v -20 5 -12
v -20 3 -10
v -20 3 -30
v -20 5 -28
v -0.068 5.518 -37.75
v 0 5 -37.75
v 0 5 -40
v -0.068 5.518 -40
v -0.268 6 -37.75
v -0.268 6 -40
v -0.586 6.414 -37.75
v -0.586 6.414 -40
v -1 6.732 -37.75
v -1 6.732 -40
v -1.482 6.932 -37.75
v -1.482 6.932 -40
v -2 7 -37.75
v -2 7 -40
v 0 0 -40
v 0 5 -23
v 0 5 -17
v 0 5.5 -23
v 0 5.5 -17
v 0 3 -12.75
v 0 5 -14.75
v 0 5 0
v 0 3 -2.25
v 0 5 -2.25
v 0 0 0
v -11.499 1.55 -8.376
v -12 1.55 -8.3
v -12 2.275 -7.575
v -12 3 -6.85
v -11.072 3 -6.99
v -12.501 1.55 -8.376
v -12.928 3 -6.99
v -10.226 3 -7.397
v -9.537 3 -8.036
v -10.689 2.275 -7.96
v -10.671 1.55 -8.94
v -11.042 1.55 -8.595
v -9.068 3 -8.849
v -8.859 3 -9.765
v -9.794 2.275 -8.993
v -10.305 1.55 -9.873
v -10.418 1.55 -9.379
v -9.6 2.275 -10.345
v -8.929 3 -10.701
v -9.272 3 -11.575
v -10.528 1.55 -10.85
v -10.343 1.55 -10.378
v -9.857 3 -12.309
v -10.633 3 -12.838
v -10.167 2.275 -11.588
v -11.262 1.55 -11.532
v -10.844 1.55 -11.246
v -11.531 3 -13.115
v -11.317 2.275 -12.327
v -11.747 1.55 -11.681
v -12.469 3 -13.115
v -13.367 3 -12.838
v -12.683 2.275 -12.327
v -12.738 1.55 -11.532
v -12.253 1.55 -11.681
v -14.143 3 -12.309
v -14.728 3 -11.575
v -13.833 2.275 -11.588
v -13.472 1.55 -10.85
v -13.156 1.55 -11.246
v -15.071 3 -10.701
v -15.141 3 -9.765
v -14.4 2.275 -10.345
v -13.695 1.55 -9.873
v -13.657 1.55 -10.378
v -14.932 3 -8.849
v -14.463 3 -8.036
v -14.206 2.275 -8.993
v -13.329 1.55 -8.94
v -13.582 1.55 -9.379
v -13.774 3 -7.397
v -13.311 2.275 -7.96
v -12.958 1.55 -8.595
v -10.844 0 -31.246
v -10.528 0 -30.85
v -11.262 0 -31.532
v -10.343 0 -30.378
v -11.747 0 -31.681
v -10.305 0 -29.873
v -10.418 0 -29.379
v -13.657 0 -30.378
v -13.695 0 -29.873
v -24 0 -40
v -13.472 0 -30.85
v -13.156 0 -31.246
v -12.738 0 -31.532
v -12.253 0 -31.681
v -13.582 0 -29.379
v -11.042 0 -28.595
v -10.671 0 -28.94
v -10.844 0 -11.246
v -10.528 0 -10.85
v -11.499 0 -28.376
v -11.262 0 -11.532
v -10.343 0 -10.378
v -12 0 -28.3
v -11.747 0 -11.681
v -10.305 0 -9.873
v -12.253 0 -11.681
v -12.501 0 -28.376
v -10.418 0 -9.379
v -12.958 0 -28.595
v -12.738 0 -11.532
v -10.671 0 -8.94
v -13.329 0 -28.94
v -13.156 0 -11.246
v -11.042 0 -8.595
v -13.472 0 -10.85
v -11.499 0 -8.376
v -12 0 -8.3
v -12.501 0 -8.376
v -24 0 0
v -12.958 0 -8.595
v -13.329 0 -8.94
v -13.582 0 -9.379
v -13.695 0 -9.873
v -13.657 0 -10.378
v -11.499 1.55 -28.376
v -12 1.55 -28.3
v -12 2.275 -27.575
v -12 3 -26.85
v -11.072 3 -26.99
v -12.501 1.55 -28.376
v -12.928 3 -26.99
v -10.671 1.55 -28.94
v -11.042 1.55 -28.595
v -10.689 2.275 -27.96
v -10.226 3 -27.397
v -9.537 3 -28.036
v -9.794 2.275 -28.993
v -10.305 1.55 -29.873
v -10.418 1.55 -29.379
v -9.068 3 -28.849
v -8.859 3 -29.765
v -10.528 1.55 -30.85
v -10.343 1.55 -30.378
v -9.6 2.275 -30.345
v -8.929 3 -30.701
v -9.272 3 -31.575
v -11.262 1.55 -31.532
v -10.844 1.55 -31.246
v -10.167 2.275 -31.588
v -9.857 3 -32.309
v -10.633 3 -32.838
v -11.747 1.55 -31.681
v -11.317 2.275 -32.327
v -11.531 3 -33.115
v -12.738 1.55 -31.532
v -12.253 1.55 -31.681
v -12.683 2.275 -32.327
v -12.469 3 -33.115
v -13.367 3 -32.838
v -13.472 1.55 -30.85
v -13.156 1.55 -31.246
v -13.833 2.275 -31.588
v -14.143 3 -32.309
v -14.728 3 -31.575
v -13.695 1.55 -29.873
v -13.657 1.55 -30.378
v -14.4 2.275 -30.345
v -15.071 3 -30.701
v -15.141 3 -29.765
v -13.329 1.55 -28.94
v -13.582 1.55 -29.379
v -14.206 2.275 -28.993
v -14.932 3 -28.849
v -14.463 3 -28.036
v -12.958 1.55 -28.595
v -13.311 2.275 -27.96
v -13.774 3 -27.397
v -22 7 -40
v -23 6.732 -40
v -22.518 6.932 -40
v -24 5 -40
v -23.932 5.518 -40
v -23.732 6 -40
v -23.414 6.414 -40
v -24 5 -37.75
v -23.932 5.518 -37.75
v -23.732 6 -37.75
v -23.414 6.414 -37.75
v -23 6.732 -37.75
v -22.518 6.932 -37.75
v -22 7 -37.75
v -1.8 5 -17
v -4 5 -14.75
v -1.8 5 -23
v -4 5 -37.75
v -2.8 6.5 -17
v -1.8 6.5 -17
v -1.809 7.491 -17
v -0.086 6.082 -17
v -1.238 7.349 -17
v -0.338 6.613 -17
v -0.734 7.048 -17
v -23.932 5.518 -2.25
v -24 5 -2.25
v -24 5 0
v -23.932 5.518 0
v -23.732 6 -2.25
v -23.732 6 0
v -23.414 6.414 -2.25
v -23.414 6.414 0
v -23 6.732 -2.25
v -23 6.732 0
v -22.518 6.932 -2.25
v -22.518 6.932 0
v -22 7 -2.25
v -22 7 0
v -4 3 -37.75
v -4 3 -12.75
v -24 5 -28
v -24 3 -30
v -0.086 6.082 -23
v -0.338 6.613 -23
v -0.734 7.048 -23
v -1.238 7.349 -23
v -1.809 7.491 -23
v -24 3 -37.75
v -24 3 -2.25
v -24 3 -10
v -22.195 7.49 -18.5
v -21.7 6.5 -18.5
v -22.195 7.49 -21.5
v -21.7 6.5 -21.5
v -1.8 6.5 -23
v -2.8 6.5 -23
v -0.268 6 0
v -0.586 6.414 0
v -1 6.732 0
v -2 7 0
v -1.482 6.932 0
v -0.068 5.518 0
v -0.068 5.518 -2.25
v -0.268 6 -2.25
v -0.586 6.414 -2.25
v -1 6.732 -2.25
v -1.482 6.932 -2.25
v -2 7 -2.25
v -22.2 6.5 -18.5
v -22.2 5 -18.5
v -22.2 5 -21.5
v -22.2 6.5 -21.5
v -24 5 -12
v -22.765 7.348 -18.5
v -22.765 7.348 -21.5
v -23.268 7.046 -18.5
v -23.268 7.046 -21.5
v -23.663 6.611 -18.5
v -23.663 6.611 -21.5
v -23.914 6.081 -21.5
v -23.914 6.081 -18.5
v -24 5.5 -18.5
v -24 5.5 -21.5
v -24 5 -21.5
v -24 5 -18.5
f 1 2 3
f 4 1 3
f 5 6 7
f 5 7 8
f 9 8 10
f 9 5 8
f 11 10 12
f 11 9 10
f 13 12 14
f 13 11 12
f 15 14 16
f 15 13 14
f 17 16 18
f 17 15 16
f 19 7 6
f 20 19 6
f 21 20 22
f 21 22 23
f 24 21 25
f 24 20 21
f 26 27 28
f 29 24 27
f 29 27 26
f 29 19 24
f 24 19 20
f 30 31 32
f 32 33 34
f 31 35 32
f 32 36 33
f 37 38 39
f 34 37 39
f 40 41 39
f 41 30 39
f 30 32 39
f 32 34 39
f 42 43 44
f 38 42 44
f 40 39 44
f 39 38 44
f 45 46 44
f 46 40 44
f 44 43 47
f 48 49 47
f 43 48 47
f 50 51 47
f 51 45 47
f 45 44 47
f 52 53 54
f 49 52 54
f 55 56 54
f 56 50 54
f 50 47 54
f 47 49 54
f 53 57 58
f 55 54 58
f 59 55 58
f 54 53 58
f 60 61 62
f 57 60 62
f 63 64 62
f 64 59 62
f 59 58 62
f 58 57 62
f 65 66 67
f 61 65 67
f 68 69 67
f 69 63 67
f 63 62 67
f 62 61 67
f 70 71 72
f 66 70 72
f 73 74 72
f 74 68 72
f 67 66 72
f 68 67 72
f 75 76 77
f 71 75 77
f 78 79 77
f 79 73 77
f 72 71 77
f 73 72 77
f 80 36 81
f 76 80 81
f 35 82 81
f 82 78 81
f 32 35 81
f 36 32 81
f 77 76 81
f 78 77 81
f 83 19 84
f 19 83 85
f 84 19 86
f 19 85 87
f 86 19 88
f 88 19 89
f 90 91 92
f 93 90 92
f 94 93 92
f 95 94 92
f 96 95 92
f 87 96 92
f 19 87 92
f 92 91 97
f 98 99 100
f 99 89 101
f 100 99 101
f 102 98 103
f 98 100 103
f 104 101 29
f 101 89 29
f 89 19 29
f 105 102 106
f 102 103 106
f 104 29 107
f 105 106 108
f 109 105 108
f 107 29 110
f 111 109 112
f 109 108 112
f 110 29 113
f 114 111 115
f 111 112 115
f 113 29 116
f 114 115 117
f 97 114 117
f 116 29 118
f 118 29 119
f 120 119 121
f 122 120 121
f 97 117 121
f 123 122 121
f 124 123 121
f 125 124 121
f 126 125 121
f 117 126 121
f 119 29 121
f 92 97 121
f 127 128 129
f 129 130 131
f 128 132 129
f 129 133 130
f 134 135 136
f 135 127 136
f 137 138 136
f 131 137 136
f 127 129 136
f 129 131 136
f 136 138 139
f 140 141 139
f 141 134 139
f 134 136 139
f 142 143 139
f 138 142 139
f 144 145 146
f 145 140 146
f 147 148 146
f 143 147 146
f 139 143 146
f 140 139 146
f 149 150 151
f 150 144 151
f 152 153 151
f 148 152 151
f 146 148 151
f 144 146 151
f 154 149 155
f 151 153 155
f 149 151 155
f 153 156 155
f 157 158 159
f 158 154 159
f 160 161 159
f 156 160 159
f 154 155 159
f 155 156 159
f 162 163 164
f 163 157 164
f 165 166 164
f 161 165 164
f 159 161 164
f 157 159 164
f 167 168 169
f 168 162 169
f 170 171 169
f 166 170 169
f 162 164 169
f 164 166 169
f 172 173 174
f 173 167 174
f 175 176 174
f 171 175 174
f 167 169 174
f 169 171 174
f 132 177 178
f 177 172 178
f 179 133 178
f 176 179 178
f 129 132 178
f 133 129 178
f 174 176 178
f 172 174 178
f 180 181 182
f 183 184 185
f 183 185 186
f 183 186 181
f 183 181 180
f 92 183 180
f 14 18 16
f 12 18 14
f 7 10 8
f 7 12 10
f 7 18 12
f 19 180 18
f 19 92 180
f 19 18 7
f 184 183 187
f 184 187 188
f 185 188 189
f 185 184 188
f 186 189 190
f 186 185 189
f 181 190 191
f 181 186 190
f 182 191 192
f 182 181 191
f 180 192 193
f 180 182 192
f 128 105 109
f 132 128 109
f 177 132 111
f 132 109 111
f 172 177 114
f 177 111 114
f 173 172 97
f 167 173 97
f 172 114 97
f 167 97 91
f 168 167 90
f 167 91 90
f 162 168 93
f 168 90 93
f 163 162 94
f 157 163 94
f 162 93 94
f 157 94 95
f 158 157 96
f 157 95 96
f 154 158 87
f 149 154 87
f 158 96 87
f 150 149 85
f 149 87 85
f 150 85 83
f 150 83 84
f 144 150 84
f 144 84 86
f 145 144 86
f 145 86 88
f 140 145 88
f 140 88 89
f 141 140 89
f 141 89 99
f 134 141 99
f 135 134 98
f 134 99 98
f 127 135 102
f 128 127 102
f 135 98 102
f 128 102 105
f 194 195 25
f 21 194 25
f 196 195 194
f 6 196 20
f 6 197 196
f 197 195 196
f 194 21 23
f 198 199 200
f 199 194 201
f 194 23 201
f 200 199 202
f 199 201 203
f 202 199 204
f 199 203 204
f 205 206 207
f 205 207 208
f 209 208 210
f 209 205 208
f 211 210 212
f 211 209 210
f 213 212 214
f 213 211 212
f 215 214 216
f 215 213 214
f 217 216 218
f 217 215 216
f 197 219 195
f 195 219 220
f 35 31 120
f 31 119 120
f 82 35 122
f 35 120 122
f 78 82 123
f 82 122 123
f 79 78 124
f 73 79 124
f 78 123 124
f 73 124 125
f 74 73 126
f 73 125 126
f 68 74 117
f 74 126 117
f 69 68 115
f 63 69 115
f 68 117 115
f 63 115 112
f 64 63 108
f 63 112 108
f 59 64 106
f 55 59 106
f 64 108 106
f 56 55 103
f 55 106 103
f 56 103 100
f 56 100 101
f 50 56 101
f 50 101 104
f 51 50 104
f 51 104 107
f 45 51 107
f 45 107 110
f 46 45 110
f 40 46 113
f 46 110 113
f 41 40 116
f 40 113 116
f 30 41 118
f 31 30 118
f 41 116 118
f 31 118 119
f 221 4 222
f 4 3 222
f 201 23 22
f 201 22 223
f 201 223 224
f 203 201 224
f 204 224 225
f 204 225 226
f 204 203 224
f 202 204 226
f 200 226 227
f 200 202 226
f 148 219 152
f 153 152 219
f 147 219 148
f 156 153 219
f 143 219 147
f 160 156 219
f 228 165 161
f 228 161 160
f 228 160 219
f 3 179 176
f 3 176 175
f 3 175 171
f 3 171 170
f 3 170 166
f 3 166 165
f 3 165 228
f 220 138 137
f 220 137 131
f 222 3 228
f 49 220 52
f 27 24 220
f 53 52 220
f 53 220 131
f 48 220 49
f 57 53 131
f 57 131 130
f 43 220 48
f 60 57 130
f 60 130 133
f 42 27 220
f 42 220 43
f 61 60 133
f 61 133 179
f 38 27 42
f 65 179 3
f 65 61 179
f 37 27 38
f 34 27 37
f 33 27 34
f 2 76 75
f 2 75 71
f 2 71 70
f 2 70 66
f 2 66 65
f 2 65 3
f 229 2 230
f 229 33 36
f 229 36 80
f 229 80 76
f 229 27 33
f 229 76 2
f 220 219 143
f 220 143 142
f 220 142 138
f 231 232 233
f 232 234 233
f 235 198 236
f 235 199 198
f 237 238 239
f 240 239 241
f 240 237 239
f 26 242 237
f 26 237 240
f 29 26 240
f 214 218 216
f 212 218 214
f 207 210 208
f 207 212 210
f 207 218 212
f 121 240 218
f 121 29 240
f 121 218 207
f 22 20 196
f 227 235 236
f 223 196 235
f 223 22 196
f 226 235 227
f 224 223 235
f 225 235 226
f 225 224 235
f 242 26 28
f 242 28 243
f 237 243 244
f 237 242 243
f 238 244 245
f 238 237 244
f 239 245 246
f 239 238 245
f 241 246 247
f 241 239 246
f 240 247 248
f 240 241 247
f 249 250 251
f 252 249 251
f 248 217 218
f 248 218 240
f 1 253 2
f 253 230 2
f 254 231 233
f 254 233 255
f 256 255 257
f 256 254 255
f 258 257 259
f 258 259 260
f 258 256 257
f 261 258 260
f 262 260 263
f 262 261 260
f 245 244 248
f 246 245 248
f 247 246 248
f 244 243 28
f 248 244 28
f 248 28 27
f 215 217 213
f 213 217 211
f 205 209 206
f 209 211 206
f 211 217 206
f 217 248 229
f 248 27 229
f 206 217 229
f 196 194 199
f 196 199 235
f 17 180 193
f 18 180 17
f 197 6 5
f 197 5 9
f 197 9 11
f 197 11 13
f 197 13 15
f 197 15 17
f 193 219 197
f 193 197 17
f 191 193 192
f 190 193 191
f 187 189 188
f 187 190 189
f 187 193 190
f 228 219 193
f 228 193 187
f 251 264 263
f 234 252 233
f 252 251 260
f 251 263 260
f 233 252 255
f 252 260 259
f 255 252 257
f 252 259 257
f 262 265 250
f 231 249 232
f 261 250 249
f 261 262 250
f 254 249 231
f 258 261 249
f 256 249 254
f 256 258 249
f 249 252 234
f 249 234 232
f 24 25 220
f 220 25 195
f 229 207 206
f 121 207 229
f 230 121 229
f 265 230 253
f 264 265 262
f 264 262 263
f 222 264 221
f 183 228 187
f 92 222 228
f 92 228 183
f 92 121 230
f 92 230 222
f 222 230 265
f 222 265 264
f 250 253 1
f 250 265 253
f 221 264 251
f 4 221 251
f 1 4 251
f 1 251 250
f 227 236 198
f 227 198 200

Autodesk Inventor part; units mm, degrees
ref_plane "YZ Plane" through (0, 0, 0) normal (1, 0, 0) x (0, 1, 0)
ref_plane "XZ Plane" through (0, 0, 0) normal (0, 1, 0) x (-1, 0, 0)
ref_plane "XY Plane" through (0, 0, 0) normal (0, 0, 1) x (1, 0, 0)
sketch "Skizze1" plane through (0, 0, 0) normal (0, 1, 0) x (-1, 0, 0)
  line L0 (0, 0) -> (24, 0)
  line L1 (24, 0) -> (24, -40)
  line L2 (24, -40) -> (0, -40)
  line L3 (0, -40) -> (0, 0)
  dimension "d0" = 40
  dimension "d1" = 24
extrude "Extrusion1" add sketch "Skizze1" along normal blind 3
sketch "Skizze2" plane through (0, 3, 0) normal (0, 1, 0) x (1, 0, 0)
  line L0 (-24, 40) -> (-24, 0) projected
  line L1 (0, 0) -> (0, 40) projected
  line L2 (-24, 0) -> (0, 0)
  line L3 (0, 0) -> (0, 2.25)
  line L4 (0, 2.25) -> (-24, 2.25)
  line L5 (-24, 2.25) -> (-24, 0)
  line L6 (0, 40) -> (-24, 40) projected
  line L7 (-24, 40) -> (0, 40)
  line L8 (0, 40) -> (0, 37.75)
  line L9 (0, 37.75) -> (-24, 37.75)
  line L10 (-24, 37.75) -> (-24, 40)
  dimension "d4" = 2.25
  dimension "d5" = 2.25
extrude "Extrusion2" add sketch "Skizze2" along normal blind 4 contours L6 L1 L9 L0 | L4 L1 L2 L0
sketch "Skizze4" plane through (0, 3, 0) normal (0, 1, 0) x (1, 0, 0)
  line L0 (0, 2.25) -> (-24, 2.25) projected
  line L1 (0, 2.25) -> (-1.8184, 2.25)
  line L2 (0, 37.75) -> (-1.8184, 37.75)
  line L3 (-24.0183, 2.25) -> (-21.7244, 2.25)
  line L4 (-24, 37.75) -> (-21.1801, 37.75)
  line L5 (0, 37.75) -> (-4, 37.75)
  line L6 (-4, 37.75) -> (-4, 12.75)
  line L7 (-4, 12.75) -> (0, 12.75)
  line L8 (0, 12.75) -> (0, 37.75)
  line L9 (-24, 37.75) -> (-24, 2.25) projected
  line L10 (-24, 10) -> (-20, 10)
  line L11 (-20, 10) -> (-20, 30)
  line L12 (-20, 30) -> (-24, 30)
  line L13 (-24, 30) -> (-24, 10)
  line L14 (-24, 0) -> (0, 0) projected
  dimension "d25" = 25
  dimension "d26" = 4
  dimension "d27" = 4
  dimension "d29" = 20
  dimension "d30" = 10
extrude "Extrusion4" add sketch "Skizze4" along normal blind 2
sketch "Skizze5" plane through (0, 5, 0) normal (0, 1, 0) x (1, 0, 0)
  line L0 (-24, 30) -> (-24, 10) projected
  line L1 (-24, 20) -> (0, 20)
  line L2 (0, 0) -> (0, 40) projected
  line L3 (-24, 18.5) -> (-22.2, 18.5)
  line L4 (-22.2, 18.5) -> (-22.2, 21.5)
  line L5 (-22.2, 21.5) -> (-24, 21.5)
  line L6 (-24, 21.5) -> (-24, 18.5)
  line L7 (0, 17) -> (-1.8, 17)
  line L8 (-1.8, 17) -> (-1.8, 23)
  line L9 (-1.8, 23) -> (0, 23)
  line L10 (0, 23) -> (0, 17)
  point P0 (-23.1, 18.5)
  point P1 (0, 23)
  dimension "d33" = 3
  dimension "d34" = 1.8
  dimension "d35" = 1.8
  dimension "d36" = 6
extrude "Extrusion5" add sketch "Skizze5" along normal blind 2.5
sketch "Skizze6" plane through (-1.8, 5, -23) normal (-1, 0, 0) x (0, 0, 1)
  line L0 (0, 0) -> (0, 2.5) projected
  line L1 (6, 0) -> (6, 2.5) projected
  line L2 (0, 2.5) -> (6, 2.5)
  line L3 (6, 2.5) -> (6, 1.5)
  line L4 (6, 1.5) -> (0, 1.5)
  line L5 (0, 1.5) -> (0, 2.5)
  point P0 (23, -5)
  point P1 (0, 1.5)
  dimension "d39" = 1
extrude "Extrusion6" add sketch "Skizze6" along normal blind 1
sketch "Skizze7" plane through (0, 5, -23) normal (0, 0, -1) x (-1, 0, 0)
  line L0 (2.8, 2.5) -> (2.8, 1.5) projected
  line L1 (2.8, 1.5) -> (1.8, 2.5)
  line L2 (0, 2.5) -> (2.8, 2.5) projected
  line L3 (1.8, 2.5) -> (2.8, 2.5)
  line L4 (2.8, 2.5) -> (2.8, 1.5)
  point P0 (0, -5)
  dimension "d42" = 1
  dimension "d43" = 1
extrude "Extrusion7" cut sketch "Skizze7" against normal blind 10
sketch "Skizze9" plane through (-22.2, 5, -18.5) normal (1, 0, 0) x (0, 0, -1)
  line L0 (0, 0) -> (0, 2.5) projected
  line L1 (3, 0) -> (3, 2.5) projected
  line L2 (0, 2.5) -> (3, 2.5)
  line L3 (3, 2.5) -> (3, 1.5)
  line L4 (3, 1.5) -> (0, 1.5)
  line L5 (0, 1.5) -> (0, 2.5)
  line L6 (3, 0) -> (0, 0) projected
  point P0 (-18.5, -5)
  point P1 (0, 1.5)
  dimension "d46" = 1.5
extrude "Extrusion8" add sketch "Skizze9" along normal blind 0.5 contours L0 L2 L1 L4
sketch "Skizze11" plane through (-22.2, 5, -21.5) normal (0, 0, -1) x (-1, 0, 0)
  line L0 (-0.5, 2.5) -> (-0.5, 1.5)
  line L1 (-0.5, 1.5) -> (0, 2.5)
  line L2 (1.8, 2.5) -> (-0.5, 2.5) projected
  line L3 (-0.5, 1.5) -> (-0.5, 2.5) projected
  line L4 (-0.5, 2.5) -> (0, 2.5)
  point P0 (-22.2, -5)
  dimension "d49" = 0.5
extrude "Extrusion9" cut sketch "Skizze11" against normal blind 10
chamfer "Fasen1" distance 2 angle 45 3 edges at (-22, 5, -30) (-22, 5, -10) (-2, 5, -12.75)
fillet "Rundung1" radius 2 6 edges at (0, 7.5, -20) (-24, 7.5, -20) (-24, 7, -1.125) (0, 7, -1.125) (-24, 7, -38.875) (0, 7, -38.875)
sketch "Skizze12" plane through (0, 3, 0) normal (0, 1, 0) x (1, 0, 0)
  line L0 (-24, 0) -> (0, 0) projected
  line L1 (-12, 0) -> (-12, 40)
  line L2 (0, 40) -> (-24, 40) projected
  circle A0 centre (-12, 10) radius 2
  circle A1 centre (-12, 30) radius 2
  line L3 (-24, 40) -> (-24, 0) projected
  line L4 (-24, 20) -> (0, 20) construction
  line L5 (0, 17) -> (0, 23) projected
  dimension "d56" = 4
  dimension "d57" = 4
  dimension "d58" = 20
hole "Bohrung1" at (-12, 3, -10) at (-12, 3, -30) direction (0, -1, 0) diameter 3.4 depth 8.8 tip angle 118 countersink diameter 6.3 countersink angle 90 clearance for "Flachkopfsenkschraube ISO 2009/7046" size "M3" standard "ISO"
properties part number "Halter_Treiber_LED"
